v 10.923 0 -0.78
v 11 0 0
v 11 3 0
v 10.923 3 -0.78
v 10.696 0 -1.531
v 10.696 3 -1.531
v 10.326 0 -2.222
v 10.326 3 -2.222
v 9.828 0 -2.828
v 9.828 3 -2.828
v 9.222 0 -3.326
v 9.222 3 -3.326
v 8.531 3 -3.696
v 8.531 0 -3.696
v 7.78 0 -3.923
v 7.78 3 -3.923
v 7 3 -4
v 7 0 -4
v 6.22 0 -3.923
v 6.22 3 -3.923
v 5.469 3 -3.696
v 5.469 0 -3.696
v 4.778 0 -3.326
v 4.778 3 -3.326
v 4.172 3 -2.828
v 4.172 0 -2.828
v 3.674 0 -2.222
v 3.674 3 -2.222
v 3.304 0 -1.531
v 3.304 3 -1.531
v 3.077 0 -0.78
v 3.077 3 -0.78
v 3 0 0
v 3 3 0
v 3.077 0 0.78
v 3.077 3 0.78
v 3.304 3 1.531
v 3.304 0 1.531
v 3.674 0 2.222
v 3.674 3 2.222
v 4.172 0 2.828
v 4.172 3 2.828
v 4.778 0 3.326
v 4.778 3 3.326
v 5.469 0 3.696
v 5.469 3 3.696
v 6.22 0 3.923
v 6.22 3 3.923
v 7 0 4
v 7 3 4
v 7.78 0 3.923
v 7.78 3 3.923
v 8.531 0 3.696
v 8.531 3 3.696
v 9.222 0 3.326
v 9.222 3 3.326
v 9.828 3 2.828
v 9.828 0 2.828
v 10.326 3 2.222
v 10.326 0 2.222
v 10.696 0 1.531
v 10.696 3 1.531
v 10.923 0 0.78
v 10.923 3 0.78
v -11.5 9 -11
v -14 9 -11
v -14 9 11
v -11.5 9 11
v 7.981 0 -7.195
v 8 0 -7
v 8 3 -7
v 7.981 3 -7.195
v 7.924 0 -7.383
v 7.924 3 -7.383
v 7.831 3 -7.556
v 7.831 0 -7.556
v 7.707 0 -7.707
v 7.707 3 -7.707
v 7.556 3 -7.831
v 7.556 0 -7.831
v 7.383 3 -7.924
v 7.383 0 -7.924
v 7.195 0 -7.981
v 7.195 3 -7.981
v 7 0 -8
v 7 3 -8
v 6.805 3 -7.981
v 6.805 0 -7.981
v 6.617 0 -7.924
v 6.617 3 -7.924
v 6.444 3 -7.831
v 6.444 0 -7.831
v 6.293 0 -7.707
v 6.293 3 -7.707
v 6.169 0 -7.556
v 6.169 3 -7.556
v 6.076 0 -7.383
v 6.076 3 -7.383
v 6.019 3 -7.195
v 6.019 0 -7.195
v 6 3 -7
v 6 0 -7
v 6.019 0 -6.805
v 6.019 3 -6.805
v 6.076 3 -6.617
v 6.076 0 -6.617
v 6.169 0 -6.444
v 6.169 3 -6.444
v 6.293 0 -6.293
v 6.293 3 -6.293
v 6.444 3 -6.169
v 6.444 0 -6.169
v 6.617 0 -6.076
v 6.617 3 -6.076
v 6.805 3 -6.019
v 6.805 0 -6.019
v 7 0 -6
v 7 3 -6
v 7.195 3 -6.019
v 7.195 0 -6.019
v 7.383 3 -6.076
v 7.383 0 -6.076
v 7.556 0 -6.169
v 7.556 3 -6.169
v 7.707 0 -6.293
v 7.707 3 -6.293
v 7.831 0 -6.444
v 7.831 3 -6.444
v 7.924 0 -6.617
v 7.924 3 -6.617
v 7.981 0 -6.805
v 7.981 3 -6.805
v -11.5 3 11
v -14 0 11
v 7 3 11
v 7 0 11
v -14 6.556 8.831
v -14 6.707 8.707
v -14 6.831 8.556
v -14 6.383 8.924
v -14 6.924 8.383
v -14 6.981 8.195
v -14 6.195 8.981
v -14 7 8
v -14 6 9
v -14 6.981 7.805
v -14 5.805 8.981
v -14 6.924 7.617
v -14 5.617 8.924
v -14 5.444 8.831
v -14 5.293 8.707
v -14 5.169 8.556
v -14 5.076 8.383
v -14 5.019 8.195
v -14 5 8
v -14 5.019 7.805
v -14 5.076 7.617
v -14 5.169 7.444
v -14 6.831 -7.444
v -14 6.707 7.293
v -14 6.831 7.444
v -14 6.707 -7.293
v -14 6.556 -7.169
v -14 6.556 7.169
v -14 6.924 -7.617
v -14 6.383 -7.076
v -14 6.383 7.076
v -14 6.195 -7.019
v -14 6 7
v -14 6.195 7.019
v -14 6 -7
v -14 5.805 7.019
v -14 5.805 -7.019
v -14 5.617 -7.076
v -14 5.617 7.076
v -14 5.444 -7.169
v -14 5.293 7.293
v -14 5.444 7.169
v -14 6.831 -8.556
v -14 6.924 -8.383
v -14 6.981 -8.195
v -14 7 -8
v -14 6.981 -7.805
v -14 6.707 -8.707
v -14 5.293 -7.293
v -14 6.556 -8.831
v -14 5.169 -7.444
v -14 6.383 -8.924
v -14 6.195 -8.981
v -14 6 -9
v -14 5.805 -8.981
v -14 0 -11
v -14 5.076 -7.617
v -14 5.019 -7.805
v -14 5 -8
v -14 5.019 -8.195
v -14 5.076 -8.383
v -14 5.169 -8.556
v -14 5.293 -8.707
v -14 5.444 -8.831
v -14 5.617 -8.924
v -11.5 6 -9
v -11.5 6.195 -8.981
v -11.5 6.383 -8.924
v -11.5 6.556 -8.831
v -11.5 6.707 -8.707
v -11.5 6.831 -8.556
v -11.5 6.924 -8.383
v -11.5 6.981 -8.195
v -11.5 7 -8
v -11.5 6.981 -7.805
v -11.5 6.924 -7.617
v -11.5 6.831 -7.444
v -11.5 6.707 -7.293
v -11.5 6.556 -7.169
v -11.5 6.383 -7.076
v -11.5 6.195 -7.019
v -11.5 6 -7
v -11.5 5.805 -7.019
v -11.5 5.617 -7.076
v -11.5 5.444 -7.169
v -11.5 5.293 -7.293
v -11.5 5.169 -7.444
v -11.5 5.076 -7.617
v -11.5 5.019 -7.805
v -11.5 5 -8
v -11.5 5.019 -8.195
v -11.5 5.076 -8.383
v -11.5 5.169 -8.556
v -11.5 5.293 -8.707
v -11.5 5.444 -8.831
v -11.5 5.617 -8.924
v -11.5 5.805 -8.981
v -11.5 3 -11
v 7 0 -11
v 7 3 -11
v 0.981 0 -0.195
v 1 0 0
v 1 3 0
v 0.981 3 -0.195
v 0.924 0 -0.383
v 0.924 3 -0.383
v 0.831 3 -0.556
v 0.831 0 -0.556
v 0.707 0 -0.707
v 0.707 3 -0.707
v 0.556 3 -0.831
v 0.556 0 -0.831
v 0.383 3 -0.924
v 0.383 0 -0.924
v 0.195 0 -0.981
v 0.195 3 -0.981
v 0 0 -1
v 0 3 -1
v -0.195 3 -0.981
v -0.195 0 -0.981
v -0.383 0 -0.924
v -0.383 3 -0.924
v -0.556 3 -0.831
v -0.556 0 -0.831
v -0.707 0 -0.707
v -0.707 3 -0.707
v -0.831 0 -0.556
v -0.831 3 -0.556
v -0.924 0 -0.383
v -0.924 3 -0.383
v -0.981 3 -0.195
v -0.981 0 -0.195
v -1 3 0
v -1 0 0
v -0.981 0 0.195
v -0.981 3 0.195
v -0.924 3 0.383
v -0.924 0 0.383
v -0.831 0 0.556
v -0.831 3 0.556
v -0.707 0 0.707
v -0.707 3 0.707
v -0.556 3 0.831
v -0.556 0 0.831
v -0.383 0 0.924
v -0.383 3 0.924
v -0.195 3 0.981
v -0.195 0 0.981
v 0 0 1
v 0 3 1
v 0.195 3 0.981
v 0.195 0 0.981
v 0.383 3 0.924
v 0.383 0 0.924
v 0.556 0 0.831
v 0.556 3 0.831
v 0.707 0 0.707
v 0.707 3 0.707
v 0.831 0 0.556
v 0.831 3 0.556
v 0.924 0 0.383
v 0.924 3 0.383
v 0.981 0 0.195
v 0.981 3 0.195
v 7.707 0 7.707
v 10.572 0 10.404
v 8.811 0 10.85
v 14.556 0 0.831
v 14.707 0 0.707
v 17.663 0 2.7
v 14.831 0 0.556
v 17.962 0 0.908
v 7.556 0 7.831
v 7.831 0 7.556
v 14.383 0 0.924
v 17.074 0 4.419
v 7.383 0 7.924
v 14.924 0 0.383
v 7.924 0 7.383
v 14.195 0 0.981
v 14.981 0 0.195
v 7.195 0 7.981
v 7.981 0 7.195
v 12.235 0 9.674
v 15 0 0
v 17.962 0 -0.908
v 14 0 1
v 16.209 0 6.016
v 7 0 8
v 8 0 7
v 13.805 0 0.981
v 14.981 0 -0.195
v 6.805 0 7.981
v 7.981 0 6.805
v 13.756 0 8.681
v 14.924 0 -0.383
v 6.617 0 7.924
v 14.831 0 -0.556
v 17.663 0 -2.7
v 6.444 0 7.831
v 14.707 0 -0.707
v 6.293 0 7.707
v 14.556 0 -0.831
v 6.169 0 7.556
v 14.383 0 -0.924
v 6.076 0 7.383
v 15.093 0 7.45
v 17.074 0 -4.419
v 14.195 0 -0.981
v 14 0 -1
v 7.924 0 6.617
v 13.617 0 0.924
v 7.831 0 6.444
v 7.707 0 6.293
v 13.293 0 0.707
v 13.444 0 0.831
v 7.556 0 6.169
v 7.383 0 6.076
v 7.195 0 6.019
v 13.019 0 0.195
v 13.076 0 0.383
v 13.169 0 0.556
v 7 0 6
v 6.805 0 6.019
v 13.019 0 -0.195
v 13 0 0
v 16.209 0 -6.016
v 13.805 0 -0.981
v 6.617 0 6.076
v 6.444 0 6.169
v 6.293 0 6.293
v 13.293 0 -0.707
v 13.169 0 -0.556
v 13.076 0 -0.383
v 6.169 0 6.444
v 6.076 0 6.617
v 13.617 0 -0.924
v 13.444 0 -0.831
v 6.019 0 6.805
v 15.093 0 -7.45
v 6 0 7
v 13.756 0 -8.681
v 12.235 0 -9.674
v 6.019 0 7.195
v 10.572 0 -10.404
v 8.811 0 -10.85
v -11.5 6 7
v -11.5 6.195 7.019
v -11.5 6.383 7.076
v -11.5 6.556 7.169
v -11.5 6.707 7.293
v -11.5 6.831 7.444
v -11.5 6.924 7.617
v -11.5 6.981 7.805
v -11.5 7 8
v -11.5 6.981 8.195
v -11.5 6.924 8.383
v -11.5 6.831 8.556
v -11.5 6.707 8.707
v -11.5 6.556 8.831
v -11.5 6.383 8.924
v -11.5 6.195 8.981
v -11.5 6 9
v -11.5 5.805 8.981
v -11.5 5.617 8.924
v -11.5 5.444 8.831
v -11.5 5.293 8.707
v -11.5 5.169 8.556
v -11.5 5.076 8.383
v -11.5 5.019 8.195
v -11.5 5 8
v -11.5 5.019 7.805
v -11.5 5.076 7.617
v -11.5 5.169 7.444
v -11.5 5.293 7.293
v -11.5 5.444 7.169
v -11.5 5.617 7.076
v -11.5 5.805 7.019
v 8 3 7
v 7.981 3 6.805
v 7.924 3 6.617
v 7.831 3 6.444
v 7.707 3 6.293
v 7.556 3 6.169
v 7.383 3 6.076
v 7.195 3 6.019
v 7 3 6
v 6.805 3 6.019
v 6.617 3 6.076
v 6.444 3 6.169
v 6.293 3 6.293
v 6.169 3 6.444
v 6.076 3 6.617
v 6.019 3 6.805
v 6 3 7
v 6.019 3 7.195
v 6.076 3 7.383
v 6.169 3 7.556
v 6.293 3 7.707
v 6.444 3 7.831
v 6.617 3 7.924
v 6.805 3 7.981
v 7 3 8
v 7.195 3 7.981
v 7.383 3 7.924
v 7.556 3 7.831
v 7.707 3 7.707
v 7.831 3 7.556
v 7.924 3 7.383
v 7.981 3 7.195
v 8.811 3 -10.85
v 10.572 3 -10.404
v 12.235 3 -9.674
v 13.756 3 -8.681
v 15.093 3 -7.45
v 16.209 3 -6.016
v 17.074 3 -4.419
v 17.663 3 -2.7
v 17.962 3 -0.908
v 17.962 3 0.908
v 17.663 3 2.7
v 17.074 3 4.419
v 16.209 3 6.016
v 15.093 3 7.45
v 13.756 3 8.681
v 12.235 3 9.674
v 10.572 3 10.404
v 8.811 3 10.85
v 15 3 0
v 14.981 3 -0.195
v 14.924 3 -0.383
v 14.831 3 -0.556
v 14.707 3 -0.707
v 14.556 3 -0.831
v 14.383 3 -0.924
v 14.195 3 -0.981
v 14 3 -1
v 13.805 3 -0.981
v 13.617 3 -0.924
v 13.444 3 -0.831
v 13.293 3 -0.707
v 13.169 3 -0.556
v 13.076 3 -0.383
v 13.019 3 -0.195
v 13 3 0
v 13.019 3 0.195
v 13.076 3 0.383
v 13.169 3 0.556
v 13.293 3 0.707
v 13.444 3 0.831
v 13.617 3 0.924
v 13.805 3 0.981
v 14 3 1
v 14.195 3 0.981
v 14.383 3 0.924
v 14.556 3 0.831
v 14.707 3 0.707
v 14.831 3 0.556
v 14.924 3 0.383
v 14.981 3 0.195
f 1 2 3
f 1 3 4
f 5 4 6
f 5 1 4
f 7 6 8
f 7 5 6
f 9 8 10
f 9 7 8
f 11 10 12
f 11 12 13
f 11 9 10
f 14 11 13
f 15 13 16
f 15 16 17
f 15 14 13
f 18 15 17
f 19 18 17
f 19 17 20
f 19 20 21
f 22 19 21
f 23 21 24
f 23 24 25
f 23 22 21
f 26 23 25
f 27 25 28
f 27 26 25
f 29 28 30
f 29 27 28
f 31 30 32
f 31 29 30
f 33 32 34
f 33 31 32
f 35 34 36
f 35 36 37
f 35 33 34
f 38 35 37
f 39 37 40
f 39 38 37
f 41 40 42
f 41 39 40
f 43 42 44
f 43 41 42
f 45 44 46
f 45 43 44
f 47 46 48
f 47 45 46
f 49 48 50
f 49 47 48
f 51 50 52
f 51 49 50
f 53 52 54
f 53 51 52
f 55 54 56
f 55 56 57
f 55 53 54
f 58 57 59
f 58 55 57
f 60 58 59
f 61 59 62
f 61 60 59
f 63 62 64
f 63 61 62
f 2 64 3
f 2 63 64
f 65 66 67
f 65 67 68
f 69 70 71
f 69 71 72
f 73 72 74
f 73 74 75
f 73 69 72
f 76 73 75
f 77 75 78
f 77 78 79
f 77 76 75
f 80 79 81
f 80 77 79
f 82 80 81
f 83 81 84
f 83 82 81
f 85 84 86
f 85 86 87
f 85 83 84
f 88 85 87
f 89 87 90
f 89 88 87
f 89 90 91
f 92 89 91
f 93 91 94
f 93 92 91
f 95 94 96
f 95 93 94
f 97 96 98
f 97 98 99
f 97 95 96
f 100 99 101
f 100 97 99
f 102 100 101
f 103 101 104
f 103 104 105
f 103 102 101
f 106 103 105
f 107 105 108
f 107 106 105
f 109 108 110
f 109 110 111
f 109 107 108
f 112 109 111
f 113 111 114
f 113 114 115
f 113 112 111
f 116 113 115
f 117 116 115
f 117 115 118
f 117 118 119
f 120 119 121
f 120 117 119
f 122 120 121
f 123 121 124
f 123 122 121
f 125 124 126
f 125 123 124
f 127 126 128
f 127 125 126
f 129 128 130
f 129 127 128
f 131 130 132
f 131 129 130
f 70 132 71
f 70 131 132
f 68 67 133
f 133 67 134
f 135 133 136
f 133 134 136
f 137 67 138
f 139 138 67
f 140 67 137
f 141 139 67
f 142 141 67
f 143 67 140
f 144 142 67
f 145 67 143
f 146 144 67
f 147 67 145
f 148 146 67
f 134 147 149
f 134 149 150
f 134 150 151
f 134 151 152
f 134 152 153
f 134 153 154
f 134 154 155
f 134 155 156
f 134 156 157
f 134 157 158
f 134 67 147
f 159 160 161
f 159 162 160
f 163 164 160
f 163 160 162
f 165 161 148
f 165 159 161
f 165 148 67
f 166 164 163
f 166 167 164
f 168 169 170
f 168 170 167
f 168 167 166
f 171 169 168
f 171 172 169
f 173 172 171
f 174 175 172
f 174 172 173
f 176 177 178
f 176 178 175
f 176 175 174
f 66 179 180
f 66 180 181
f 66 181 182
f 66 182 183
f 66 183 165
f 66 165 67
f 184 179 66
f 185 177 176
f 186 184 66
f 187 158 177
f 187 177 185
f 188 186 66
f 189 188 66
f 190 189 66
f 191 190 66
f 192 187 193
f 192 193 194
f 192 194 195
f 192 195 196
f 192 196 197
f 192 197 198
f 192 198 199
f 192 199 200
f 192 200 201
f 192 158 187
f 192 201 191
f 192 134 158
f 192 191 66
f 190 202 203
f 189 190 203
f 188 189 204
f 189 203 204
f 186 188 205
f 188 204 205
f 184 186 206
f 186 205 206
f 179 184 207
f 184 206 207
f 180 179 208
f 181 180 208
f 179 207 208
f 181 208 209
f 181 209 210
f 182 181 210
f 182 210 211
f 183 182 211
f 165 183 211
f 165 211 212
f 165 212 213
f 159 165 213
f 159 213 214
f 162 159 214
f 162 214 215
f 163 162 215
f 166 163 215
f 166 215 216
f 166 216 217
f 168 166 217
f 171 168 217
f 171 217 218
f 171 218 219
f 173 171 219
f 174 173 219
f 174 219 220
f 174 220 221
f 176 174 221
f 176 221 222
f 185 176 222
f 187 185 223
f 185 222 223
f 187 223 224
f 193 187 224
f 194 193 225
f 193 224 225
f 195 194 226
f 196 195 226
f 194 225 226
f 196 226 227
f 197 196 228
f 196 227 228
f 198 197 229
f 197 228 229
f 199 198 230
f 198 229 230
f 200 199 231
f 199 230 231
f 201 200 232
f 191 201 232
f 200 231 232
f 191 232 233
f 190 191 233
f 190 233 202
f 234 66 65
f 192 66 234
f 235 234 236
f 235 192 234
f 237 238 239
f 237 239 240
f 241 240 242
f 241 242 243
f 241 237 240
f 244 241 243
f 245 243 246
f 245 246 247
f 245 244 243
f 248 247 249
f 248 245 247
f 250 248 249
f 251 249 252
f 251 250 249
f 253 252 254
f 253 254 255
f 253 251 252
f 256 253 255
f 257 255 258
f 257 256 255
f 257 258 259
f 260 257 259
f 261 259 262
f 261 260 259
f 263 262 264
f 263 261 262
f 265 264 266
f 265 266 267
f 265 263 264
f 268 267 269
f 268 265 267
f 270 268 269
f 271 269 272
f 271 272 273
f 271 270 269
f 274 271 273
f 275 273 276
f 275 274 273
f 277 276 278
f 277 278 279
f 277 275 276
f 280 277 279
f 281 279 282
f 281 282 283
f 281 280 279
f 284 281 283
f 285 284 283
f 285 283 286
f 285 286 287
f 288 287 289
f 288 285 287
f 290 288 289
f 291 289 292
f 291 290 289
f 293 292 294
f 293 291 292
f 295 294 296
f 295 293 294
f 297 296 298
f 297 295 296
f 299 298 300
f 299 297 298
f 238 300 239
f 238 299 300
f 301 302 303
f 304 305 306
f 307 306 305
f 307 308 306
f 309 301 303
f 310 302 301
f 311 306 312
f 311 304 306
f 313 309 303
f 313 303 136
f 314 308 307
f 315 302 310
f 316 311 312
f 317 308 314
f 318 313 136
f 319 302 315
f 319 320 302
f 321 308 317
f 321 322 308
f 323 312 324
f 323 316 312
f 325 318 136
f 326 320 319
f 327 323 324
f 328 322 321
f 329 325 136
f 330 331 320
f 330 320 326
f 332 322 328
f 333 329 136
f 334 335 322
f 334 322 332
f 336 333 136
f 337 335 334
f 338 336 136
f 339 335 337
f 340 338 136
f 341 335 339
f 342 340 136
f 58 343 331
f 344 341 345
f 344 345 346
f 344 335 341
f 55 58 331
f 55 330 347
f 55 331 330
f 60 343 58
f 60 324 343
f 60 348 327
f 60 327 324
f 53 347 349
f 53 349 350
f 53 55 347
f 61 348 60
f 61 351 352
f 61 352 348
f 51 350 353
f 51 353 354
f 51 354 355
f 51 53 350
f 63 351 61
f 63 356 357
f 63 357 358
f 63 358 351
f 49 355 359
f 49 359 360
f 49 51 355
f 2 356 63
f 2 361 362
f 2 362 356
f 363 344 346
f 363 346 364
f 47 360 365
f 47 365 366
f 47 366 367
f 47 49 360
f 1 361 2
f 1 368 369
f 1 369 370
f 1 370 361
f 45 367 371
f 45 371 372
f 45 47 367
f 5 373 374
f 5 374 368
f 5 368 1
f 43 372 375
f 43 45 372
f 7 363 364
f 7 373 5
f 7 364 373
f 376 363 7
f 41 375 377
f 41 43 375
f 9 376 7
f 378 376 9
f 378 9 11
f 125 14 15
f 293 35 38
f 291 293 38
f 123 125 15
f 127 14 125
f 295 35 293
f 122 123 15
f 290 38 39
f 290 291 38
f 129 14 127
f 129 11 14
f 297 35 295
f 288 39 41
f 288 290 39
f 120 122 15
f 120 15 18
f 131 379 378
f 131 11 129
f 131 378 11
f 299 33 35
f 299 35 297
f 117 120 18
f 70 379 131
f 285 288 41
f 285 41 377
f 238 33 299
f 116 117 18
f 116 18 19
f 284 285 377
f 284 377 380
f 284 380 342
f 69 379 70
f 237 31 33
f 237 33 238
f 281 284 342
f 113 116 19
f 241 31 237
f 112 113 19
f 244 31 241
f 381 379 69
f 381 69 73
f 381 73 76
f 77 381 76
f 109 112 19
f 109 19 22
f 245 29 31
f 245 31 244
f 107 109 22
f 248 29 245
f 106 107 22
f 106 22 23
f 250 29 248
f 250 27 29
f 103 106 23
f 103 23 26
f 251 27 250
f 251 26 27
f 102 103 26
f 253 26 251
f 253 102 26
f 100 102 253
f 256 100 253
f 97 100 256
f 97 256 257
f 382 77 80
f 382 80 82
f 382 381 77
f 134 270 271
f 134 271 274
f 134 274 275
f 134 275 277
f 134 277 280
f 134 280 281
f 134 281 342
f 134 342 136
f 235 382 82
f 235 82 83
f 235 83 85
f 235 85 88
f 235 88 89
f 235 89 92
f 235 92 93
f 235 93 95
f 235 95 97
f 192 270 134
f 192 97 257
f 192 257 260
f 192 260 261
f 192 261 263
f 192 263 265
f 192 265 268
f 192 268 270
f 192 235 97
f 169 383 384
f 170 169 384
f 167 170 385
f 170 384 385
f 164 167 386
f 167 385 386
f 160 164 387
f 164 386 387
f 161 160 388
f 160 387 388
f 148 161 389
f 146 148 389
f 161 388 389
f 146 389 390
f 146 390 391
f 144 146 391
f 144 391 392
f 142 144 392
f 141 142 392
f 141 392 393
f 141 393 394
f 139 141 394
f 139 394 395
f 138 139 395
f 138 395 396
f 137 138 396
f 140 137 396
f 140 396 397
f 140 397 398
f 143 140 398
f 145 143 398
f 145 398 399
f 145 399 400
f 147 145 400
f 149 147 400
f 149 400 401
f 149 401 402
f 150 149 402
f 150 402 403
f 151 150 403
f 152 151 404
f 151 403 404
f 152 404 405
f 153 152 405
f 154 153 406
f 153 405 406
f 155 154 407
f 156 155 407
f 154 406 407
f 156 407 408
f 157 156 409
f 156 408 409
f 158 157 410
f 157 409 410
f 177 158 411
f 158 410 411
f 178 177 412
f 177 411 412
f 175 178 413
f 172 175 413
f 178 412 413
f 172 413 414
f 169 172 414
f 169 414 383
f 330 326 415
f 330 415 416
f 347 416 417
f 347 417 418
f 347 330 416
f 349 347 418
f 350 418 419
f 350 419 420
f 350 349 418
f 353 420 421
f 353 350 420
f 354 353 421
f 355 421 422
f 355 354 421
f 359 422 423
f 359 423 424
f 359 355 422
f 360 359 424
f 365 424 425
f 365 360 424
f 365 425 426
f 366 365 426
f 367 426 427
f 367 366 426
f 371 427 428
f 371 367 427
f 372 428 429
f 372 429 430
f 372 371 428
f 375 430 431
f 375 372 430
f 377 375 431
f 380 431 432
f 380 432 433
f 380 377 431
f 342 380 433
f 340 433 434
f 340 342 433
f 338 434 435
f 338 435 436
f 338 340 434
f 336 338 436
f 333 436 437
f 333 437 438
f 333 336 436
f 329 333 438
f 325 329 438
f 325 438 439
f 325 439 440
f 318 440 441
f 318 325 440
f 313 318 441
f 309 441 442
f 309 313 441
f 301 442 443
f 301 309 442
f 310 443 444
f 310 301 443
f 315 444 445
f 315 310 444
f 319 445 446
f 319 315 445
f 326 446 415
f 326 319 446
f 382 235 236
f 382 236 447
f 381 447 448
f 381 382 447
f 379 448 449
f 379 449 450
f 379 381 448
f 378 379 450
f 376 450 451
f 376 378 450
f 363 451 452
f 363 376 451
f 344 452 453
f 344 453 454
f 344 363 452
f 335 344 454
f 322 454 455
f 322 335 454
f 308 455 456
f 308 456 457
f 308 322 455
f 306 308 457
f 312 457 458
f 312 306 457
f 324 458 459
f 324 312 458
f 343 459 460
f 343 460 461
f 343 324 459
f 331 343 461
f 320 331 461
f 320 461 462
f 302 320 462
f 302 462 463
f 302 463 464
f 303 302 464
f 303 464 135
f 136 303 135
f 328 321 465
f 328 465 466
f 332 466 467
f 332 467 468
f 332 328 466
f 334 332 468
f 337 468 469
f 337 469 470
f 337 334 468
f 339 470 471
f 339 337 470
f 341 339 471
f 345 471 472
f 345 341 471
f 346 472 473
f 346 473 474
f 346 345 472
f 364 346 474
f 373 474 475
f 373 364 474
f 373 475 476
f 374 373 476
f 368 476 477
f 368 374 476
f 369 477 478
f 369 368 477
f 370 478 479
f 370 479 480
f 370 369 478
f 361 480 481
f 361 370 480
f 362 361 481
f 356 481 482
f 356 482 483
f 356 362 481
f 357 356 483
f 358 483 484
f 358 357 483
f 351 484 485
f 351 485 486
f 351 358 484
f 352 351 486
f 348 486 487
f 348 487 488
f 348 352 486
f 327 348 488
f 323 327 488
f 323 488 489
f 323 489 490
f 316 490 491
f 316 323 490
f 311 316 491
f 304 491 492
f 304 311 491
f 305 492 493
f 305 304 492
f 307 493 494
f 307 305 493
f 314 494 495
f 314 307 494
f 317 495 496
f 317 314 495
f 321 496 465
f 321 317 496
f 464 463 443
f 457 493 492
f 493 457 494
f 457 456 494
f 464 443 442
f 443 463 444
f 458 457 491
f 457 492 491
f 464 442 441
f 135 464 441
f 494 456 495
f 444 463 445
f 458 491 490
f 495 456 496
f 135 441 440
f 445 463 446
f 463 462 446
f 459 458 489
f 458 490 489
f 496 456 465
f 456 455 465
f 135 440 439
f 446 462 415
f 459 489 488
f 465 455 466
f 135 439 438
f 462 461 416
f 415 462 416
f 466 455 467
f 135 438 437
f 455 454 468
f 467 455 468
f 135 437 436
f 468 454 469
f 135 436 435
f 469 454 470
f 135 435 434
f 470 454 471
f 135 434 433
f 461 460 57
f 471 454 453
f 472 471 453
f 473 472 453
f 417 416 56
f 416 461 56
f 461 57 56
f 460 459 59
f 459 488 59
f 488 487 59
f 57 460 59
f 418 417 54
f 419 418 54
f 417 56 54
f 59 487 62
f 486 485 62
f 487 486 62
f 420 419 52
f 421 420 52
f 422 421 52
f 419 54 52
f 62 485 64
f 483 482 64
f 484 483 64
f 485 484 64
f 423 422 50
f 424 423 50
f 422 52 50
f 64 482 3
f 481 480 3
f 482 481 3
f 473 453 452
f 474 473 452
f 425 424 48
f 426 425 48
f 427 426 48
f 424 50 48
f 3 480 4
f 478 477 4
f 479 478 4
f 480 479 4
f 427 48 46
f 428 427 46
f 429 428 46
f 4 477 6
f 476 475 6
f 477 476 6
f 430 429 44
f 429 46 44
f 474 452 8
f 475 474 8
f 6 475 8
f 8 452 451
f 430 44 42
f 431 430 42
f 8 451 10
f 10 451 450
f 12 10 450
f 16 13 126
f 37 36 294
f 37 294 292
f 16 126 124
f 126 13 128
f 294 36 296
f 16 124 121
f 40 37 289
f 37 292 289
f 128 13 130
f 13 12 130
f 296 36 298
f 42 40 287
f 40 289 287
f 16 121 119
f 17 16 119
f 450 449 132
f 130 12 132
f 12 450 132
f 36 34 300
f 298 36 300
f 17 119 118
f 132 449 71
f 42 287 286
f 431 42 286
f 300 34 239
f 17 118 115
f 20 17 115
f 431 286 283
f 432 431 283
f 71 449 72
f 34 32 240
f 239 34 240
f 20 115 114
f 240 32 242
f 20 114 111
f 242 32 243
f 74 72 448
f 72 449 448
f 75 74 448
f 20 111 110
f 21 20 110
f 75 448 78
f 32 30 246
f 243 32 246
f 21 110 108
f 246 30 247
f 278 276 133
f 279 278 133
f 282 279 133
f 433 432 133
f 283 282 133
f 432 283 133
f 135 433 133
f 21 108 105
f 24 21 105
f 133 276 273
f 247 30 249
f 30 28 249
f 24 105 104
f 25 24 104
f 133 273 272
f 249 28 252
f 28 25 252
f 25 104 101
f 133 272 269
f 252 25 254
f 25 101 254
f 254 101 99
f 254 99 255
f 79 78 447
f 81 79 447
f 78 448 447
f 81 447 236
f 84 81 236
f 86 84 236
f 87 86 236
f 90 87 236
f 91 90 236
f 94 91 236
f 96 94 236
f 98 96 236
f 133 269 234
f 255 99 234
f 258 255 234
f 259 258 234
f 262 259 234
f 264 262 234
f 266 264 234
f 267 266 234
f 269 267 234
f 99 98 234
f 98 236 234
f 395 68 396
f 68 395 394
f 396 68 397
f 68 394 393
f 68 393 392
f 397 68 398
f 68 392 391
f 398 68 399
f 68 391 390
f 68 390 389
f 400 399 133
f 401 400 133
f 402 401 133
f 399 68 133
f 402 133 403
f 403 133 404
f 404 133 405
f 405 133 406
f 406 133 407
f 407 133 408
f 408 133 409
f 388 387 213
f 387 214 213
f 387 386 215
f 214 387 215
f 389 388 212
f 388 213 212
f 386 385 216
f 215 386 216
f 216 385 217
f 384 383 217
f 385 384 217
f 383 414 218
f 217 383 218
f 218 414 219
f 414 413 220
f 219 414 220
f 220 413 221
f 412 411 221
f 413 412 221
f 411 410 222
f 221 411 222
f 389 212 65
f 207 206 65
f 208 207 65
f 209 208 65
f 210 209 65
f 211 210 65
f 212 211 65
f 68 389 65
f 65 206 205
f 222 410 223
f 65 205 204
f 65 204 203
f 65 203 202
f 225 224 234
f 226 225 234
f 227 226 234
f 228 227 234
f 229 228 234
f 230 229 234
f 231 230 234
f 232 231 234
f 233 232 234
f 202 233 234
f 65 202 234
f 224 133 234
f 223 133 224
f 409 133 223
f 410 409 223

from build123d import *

# Parameters (mm, degrees)
SKETCH1_R           = 1
SKETCH1_R_2         = 4
BOSS_EXTRUDE1_DEPTH = 3
SKETCH2_W           = 2.5
SKETCH2_H           = 22
BOSS_EXTRUDE2_DEPTH = 6
SKETCH3_R           = 1
CUT_EXTRUDE1_DEPTH  = 6


with BuildPart() as part:
    # Sketch1 → Boss-Extrude1 (new body)
    with BuildSketch(Plane(origin=(0, 0, 0), x_dir=(1, 0, 0), z_dir=(0, 1, 0))):
        with BuildLine():
            Line((-14, -11), (-14, 11))
            Line((-14, 11), (7, 11))
            ThreePointArc((7, 11), (18, 0), (7, -11))
            Line((7, -11), (-14, -11))
        make_face()
        with Locations((7, -7)):
            Circle(SKETCH1_R, mode=Mode.SUBTRACT)
        Circle(SKETCH1_R, mode=Mode.SUBTRACT)
        with Locations((7, 0)):
            Circle(SKETCH1_R_2, mode=Mode.SUBTRACT)
        with Locations((14, 0)):
            Circle(SKETCH1_R, mode=Mode.SUBTRACT)
        with Locations((7, 7)):
            Circle(SKETCH1_R, mode=Mode.SUBTRACT)
    extrude(amount=BOSS_EXTRUDE1_DEPTH)

    # Sketch2 → Boss-Extrude2 (add)
    with BuildSketch(Plane(origin=(0, 3, 0), x_dir=(1, 0, 0), z_dir=(0, 1, 0))):
        with Locations((-12.75, 0)):
            Rectangle(SKETCH2_W, SKETCH2_H)
    extrude(amount=BOSS_EXTRUDE2_DEPTH)

    # Sketch3 → Cut-Extrude1 (cut)
    with BuildSketch(Plane(origin=(-11.5, 0, 0), x_dir=(0, 0, -1), z_dir=(1, 0, 0))):
        with Locations((8, 6)):
            Circle(SKETCH3_R)
        with Locations((-8, 6)):
            Circle(SKETCH3_R)
    extrude(amount=-CUT_EXTRUDE1_DEPTH, mode=Mode.SUBTRACT)


solid = part.part
